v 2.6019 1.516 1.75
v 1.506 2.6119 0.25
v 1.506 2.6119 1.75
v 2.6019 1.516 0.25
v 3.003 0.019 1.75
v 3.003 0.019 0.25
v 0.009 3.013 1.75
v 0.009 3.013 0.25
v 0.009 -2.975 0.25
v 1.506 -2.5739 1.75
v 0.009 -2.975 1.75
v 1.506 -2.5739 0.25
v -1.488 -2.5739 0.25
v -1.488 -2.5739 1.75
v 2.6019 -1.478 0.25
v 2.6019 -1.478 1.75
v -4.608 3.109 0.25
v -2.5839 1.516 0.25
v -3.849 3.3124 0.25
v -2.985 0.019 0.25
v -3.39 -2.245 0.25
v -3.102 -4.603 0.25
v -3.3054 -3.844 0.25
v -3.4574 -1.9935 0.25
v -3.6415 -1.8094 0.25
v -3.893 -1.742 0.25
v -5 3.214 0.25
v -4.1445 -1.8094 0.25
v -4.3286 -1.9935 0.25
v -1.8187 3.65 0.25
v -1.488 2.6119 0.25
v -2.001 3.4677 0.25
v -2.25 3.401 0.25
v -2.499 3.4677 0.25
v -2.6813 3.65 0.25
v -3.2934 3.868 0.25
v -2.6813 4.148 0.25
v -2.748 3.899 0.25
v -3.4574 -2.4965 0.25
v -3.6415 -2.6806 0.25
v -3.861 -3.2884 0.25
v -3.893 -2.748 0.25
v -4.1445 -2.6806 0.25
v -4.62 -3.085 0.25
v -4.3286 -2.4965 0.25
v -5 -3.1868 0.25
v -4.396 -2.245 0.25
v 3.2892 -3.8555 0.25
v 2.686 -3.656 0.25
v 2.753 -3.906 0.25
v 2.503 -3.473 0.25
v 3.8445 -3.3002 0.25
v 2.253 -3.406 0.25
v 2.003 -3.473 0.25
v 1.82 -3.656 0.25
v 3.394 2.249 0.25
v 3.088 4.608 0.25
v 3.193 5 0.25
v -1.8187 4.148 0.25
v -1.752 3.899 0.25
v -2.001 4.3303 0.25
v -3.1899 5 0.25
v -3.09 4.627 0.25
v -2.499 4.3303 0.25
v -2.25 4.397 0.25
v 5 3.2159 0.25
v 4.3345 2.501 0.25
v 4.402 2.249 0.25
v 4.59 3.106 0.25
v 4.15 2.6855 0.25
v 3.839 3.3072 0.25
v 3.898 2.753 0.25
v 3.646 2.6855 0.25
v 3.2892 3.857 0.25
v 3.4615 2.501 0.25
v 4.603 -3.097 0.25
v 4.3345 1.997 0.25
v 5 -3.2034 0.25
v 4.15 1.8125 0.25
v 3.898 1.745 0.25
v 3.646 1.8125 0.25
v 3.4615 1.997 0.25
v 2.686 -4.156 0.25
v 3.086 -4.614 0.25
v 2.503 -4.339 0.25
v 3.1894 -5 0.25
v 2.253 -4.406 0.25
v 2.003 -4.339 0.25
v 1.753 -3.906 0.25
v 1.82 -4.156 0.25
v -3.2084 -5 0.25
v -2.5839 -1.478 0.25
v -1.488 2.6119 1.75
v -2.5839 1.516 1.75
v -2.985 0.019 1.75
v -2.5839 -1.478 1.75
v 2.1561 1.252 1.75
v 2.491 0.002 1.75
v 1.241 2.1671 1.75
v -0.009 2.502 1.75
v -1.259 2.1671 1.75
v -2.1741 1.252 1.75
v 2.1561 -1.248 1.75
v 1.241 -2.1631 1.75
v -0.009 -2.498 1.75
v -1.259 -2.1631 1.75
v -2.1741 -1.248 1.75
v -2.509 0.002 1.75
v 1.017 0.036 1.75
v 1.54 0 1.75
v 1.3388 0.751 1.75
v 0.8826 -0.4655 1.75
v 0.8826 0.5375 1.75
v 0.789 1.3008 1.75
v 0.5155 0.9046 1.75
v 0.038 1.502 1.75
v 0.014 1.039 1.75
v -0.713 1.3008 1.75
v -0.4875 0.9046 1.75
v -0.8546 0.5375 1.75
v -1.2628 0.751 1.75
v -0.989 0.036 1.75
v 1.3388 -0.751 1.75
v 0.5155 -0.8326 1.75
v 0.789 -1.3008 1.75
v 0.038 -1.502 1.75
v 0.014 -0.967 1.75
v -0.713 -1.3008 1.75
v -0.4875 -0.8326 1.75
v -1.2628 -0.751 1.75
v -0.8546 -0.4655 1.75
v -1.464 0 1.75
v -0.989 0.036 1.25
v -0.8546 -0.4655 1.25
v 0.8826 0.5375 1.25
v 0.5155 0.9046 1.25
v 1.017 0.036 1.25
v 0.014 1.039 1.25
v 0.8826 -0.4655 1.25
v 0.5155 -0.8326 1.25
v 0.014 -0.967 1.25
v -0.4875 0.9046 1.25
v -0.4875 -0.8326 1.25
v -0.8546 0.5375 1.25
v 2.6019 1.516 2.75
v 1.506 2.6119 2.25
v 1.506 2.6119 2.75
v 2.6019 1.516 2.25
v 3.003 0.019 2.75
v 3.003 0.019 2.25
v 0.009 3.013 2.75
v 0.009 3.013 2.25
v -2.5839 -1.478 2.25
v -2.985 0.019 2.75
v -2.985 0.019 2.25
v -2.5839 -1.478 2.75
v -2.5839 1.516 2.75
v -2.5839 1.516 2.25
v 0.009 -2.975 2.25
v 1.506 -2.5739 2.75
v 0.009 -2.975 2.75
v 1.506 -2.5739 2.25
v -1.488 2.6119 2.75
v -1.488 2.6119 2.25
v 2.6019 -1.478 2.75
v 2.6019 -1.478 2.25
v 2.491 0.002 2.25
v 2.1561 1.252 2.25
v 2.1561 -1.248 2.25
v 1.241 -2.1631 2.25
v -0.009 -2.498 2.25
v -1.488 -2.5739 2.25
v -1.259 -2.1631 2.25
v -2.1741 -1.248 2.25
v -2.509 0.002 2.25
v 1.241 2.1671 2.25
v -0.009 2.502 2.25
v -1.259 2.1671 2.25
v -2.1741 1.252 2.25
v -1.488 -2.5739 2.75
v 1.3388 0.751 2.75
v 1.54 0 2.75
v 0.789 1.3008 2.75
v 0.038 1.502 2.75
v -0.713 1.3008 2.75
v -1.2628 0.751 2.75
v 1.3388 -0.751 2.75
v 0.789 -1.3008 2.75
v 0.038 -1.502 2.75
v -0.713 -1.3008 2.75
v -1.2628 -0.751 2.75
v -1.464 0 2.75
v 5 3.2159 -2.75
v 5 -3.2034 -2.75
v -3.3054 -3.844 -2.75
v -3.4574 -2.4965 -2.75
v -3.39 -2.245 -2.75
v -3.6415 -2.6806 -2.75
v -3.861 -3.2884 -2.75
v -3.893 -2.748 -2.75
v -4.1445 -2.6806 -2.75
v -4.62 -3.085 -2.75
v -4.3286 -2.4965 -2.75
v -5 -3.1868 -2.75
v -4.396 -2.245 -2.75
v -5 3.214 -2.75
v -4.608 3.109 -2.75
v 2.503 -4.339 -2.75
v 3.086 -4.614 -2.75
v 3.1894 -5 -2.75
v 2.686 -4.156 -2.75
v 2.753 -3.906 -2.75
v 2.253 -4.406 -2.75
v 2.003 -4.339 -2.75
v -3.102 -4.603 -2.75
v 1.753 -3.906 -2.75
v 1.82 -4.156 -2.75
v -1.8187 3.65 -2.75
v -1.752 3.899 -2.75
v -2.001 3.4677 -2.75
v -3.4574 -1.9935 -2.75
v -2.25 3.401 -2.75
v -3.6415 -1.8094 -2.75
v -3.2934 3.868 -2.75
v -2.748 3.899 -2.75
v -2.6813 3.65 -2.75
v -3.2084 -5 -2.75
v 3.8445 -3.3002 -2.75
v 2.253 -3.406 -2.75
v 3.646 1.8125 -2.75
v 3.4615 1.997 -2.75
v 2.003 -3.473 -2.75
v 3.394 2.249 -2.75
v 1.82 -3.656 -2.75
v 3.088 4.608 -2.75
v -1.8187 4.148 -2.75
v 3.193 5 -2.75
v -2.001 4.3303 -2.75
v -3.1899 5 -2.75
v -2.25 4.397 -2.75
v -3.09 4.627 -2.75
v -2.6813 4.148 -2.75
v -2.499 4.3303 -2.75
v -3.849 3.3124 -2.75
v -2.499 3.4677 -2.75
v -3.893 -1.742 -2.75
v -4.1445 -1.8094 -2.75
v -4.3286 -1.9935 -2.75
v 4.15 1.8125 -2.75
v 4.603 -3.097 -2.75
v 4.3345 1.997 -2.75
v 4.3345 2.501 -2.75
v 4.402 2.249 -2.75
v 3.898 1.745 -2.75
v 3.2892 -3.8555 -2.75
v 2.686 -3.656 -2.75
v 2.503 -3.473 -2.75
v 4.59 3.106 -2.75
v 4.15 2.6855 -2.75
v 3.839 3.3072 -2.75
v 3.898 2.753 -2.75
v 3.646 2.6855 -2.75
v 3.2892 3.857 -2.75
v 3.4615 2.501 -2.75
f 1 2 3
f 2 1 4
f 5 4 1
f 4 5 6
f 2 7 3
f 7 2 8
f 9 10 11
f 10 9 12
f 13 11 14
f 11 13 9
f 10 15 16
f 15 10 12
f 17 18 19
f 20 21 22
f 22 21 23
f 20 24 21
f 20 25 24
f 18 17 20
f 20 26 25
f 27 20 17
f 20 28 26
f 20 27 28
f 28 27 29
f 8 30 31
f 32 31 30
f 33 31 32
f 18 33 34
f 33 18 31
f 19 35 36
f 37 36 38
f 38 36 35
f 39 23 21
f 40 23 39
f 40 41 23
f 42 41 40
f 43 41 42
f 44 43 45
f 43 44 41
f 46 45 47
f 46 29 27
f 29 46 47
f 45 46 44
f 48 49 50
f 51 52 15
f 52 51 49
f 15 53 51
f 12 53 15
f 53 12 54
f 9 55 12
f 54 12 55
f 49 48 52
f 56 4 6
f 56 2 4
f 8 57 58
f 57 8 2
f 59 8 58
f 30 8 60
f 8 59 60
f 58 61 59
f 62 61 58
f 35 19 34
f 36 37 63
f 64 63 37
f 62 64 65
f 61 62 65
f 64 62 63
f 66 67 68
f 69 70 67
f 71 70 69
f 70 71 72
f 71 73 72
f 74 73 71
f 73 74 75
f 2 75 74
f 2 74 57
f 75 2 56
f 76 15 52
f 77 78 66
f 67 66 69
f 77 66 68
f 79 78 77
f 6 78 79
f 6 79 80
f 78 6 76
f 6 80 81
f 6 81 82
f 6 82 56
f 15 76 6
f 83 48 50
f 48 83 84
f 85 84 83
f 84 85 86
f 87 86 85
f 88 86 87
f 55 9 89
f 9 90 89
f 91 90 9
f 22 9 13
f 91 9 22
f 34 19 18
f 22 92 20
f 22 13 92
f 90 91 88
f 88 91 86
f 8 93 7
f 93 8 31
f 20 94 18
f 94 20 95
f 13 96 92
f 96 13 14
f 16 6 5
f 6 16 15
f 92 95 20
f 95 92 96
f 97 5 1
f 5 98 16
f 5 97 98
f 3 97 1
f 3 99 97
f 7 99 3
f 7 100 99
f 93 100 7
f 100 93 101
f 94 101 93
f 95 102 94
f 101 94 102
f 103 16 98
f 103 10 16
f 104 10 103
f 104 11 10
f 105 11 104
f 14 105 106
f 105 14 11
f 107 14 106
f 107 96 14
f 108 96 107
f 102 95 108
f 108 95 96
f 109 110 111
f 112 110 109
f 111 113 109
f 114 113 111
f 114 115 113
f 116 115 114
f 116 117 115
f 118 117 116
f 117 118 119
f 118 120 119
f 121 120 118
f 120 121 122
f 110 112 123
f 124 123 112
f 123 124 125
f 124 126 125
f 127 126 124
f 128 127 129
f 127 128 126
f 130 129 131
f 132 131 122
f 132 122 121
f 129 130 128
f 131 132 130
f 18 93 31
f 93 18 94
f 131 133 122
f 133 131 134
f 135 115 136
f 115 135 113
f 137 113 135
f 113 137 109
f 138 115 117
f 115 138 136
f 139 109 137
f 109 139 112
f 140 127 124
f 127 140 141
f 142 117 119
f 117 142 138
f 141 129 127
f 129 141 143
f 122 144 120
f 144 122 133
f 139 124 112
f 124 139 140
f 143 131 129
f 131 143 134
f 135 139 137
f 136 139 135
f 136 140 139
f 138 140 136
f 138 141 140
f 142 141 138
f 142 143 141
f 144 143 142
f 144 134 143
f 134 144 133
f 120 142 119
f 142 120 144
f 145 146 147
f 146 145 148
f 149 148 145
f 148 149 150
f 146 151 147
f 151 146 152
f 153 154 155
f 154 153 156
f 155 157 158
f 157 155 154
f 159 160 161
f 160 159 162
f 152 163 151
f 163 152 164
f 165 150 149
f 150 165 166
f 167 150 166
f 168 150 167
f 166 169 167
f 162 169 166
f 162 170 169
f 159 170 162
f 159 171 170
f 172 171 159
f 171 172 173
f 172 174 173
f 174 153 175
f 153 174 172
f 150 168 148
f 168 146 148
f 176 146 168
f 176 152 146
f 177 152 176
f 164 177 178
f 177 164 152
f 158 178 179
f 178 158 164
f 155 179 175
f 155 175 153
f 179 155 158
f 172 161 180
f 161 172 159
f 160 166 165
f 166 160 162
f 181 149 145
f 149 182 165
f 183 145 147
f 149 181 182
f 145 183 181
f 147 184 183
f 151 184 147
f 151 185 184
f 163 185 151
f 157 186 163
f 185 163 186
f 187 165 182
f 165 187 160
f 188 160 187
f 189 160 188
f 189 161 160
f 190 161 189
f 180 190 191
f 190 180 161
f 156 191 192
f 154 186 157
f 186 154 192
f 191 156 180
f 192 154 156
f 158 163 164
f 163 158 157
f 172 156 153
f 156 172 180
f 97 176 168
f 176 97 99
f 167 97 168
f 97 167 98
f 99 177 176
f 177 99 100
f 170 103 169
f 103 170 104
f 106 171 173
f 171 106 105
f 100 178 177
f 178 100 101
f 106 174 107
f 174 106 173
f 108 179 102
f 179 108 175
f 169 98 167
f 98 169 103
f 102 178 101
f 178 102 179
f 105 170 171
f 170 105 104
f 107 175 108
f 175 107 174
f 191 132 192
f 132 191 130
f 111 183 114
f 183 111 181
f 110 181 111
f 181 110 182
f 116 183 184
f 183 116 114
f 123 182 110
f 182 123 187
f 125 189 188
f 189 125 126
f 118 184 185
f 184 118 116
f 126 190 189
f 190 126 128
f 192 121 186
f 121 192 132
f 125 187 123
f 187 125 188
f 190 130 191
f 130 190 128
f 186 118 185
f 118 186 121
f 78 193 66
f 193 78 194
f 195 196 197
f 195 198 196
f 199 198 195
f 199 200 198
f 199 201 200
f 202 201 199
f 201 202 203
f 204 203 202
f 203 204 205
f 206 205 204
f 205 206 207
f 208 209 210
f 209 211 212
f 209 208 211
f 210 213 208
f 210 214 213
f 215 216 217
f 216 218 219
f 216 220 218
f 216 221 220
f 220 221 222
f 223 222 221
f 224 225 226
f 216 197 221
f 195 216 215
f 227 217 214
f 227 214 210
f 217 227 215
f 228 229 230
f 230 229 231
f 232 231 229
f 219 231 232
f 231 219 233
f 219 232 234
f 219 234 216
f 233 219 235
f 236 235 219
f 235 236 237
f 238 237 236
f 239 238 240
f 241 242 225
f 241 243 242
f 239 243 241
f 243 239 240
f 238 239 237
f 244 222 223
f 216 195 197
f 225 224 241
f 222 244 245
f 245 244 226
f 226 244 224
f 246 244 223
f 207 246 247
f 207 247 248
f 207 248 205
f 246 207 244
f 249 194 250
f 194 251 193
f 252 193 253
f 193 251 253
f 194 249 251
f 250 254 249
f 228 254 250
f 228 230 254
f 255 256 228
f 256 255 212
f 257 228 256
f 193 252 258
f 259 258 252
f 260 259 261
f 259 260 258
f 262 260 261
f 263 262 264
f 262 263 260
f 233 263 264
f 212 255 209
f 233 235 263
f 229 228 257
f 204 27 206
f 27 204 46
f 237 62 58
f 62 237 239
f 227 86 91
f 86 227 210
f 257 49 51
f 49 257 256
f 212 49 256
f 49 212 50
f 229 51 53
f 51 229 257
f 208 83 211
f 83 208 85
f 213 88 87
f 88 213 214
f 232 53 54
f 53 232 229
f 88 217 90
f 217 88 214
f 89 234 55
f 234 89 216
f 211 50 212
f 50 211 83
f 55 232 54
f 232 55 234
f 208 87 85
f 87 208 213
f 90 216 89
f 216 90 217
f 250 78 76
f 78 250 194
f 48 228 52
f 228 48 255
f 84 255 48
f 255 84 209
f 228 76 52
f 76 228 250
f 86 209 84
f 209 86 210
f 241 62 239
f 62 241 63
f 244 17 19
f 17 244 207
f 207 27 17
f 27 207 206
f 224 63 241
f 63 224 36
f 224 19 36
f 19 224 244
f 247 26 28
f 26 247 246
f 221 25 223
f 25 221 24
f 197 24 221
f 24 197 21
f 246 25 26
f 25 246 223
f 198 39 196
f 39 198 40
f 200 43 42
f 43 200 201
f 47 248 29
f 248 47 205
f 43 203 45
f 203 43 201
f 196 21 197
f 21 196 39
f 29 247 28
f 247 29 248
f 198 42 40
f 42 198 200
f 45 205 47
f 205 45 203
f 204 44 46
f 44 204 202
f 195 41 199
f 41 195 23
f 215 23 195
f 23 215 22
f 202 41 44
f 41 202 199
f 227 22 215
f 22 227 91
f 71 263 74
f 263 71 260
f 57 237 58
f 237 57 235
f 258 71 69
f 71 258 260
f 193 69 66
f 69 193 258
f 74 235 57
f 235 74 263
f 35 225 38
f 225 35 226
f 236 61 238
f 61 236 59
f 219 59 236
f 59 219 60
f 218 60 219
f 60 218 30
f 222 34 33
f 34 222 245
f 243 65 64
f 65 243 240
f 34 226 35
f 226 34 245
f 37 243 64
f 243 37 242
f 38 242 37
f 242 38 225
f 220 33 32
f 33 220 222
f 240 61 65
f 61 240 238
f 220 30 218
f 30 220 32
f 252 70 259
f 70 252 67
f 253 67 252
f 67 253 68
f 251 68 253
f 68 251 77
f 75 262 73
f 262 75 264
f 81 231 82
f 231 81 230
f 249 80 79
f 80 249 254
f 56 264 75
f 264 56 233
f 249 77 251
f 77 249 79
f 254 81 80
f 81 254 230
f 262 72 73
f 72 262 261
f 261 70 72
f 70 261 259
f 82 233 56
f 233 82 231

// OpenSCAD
intersection() {
translate([-6, -6, -3.3]) cube(size = [12, 12, 6.6], center = false);
union() {
difference() {
translate([0.009, 0.019, 0.25])
cylinder(h = 1.5, r1 = 2.994, r2 = 2.994, center = false, $fn = 12);
translate([0.014, 0.036, 1.25])
cylinder(h = 1, r1 = 1.003, r2 = 1.003, center = false, $fn = 12);
}
difference() {
union() {
translate([0.009, 0.019, 2.25])
cylinder(h = 0.5, r1 = 2.994, r2 = 2.994, center = false, $fn = 12);
translate([-0.009, 0.002, 1.75])
cylinder(h = 1, r1 = 2.5, r2 = 2.5, center = false, $fn = 12);
}
translate([0.038, 0, 1.75])
cylinder(h = 17.25, r1 = 1.502, r2 = 1.502, center = false, $fn = 12);
}
difference() {
difference() {
difference() {
difference() {
translate([-5, -5, -2.75]) cube(size = [10, 10, 3], center = false);
translate([2.253, -3.906, -2.75])
cylinder(h = 21.75, r1 = 0.5, r2 = 0.5, center = false, $fn = 12);
}
union() {
translate([4.603, -4.614, -2.75])
cylinder(h = 21.75, r1 = 1.517, r2 = 1.517, center = false, $fn = 12);
translate([-4.608, 4.627, -2.75])
cylinder(h = 3, r1 = 1.518, r2 = 1.518, center = false, $fn = 12);
}
}
translate([-3.893, -2.245, -2.75])
cylinder(h = 21.75, r1 = 0.503, r2 = 0.503, center = false, $fn = 12);
}
union() {
translate([-4.62, -4.603, -19])
cylinder(h = 19.25, r1 = 1.518, r2 = 1.518, center = false, $fn = 12);
translate([4.59, 4.608, -2.75])
cylinder(h = 21.75, r1 = 1.502, r2 = 1.502, center = false, $fn = 12);
translate([-2.25, 3.899, -19])
cylinder(h = 19.25, r1 = 0.498, r2 = 0.498, center = false, $fn = 12);
translate([3.898, 2.249, -19])
cylinder(h = 19.25, r1 = 0.504, r2 = 0.504, center = false, $fn = 12);
}
}
}
}
